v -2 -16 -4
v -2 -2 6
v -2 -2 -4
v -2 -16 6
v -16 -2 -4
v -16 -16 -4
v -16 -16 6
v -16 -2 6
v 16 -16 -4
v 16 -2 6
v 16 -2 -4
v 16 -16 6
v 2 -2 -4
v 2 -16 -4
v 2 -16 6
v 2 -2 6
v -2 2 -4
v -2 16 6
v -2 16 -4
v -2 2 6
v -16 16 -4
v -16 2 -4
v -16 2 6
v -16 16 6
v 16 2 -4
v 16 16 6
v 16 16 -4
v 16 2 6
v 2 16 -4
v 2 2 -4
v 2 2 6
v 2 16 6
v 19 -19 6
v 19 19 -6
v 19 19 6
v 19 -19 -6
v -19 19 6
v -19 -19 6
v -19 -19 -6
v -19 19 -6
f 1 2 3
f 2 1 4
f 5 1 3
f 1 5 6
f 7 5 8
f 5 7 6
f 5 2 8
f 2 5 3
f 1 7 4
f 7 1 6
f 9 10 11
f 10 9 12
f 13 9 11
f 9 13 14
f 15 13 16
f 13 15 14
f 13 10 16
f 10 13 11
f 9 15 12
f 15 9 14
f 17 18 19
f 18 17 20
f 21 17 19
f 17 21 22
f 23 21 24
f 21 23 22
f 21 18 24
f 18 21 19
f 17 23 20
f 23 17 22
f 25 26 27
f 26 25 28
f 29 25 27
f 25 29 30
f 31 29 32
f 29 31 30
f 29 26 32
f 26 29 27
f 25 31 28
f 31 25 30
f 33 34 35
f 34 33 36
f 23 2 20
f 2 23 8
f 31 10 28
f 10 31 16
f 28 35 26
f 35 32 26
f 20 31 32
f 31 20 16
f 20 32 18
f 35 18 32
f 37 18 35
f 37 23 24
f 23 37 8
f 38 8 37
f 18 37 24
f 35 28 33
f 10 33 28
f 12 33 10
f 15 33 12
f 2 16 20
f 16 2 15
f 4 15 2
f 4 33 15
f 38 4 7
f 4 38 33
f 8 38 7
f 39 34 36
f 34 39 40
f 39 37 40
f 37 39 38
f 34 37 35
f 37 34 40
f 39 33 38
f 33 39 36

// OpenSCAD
$fn = 32;

// ----------------------------------------------------------------------
// Pocket plate 38 x 38 x 12
// 2 x 2 pockets 14 mm square, 10 mm deep
// ----------------------------------------------------------------------

// --- parameters (mm) ---
thickness = 12;  // plate thickness
floor_t = 2;     // material left under each pocket
pocket = 14;     // pocket side length
pitch_x = 18;    // pocket pitch along X
pitch_y = 18;    // pocket pitch along Y
cols = 2;        // pockets per row
rows = 2;        // rows of pockets

// --- derived feature positions (mm) ---
depth = thickness - floor_t;        // = 10   pocket depth, down to the floor
span_x = (cols - 1) * pitch_x;      // = 18   distance between outer pockets
span_y = (rows - 1) * pitch_y;      // = 18   distance between outer pocket rows
origin_x = -span_x / 2;             // = -9   X of the first pocket
origin_y = -span_y / 2;             // = -9   Y of the first pocket
plate = [span_x + pocket + 6, span_y + pocket + 6, thickness];  // = [38, 38, 12]   overall size: pockets plus 3 mm of wall on each side
feature_centers = [
  [origin_x + 0 * pitch_x, origin_y + 0 * pitch_y],
  [origin_x + 1 * pitch_x, origin_y + 0 * pitch_y],
  [origin_x + 0 * pitch_x, origin_y + 1 * pitch_y],
  [origin_x + 1 * pitch_x, origin_y + 1 * pitch_y]
];   // pocket centres, used verbatim by the cutter loop

// plate outline, then one pocket per centre in feature_centers
difference() {
  cube(plate, center = true);
  for (centre = feature_centers)
    translate([centre[0] - pocket / 2, centre[1] - pocket / 2, plate[2] / 2 - depth])
      cube([pocket, pocket, depth + 1]);  // centred on the declared pocket centre
}
